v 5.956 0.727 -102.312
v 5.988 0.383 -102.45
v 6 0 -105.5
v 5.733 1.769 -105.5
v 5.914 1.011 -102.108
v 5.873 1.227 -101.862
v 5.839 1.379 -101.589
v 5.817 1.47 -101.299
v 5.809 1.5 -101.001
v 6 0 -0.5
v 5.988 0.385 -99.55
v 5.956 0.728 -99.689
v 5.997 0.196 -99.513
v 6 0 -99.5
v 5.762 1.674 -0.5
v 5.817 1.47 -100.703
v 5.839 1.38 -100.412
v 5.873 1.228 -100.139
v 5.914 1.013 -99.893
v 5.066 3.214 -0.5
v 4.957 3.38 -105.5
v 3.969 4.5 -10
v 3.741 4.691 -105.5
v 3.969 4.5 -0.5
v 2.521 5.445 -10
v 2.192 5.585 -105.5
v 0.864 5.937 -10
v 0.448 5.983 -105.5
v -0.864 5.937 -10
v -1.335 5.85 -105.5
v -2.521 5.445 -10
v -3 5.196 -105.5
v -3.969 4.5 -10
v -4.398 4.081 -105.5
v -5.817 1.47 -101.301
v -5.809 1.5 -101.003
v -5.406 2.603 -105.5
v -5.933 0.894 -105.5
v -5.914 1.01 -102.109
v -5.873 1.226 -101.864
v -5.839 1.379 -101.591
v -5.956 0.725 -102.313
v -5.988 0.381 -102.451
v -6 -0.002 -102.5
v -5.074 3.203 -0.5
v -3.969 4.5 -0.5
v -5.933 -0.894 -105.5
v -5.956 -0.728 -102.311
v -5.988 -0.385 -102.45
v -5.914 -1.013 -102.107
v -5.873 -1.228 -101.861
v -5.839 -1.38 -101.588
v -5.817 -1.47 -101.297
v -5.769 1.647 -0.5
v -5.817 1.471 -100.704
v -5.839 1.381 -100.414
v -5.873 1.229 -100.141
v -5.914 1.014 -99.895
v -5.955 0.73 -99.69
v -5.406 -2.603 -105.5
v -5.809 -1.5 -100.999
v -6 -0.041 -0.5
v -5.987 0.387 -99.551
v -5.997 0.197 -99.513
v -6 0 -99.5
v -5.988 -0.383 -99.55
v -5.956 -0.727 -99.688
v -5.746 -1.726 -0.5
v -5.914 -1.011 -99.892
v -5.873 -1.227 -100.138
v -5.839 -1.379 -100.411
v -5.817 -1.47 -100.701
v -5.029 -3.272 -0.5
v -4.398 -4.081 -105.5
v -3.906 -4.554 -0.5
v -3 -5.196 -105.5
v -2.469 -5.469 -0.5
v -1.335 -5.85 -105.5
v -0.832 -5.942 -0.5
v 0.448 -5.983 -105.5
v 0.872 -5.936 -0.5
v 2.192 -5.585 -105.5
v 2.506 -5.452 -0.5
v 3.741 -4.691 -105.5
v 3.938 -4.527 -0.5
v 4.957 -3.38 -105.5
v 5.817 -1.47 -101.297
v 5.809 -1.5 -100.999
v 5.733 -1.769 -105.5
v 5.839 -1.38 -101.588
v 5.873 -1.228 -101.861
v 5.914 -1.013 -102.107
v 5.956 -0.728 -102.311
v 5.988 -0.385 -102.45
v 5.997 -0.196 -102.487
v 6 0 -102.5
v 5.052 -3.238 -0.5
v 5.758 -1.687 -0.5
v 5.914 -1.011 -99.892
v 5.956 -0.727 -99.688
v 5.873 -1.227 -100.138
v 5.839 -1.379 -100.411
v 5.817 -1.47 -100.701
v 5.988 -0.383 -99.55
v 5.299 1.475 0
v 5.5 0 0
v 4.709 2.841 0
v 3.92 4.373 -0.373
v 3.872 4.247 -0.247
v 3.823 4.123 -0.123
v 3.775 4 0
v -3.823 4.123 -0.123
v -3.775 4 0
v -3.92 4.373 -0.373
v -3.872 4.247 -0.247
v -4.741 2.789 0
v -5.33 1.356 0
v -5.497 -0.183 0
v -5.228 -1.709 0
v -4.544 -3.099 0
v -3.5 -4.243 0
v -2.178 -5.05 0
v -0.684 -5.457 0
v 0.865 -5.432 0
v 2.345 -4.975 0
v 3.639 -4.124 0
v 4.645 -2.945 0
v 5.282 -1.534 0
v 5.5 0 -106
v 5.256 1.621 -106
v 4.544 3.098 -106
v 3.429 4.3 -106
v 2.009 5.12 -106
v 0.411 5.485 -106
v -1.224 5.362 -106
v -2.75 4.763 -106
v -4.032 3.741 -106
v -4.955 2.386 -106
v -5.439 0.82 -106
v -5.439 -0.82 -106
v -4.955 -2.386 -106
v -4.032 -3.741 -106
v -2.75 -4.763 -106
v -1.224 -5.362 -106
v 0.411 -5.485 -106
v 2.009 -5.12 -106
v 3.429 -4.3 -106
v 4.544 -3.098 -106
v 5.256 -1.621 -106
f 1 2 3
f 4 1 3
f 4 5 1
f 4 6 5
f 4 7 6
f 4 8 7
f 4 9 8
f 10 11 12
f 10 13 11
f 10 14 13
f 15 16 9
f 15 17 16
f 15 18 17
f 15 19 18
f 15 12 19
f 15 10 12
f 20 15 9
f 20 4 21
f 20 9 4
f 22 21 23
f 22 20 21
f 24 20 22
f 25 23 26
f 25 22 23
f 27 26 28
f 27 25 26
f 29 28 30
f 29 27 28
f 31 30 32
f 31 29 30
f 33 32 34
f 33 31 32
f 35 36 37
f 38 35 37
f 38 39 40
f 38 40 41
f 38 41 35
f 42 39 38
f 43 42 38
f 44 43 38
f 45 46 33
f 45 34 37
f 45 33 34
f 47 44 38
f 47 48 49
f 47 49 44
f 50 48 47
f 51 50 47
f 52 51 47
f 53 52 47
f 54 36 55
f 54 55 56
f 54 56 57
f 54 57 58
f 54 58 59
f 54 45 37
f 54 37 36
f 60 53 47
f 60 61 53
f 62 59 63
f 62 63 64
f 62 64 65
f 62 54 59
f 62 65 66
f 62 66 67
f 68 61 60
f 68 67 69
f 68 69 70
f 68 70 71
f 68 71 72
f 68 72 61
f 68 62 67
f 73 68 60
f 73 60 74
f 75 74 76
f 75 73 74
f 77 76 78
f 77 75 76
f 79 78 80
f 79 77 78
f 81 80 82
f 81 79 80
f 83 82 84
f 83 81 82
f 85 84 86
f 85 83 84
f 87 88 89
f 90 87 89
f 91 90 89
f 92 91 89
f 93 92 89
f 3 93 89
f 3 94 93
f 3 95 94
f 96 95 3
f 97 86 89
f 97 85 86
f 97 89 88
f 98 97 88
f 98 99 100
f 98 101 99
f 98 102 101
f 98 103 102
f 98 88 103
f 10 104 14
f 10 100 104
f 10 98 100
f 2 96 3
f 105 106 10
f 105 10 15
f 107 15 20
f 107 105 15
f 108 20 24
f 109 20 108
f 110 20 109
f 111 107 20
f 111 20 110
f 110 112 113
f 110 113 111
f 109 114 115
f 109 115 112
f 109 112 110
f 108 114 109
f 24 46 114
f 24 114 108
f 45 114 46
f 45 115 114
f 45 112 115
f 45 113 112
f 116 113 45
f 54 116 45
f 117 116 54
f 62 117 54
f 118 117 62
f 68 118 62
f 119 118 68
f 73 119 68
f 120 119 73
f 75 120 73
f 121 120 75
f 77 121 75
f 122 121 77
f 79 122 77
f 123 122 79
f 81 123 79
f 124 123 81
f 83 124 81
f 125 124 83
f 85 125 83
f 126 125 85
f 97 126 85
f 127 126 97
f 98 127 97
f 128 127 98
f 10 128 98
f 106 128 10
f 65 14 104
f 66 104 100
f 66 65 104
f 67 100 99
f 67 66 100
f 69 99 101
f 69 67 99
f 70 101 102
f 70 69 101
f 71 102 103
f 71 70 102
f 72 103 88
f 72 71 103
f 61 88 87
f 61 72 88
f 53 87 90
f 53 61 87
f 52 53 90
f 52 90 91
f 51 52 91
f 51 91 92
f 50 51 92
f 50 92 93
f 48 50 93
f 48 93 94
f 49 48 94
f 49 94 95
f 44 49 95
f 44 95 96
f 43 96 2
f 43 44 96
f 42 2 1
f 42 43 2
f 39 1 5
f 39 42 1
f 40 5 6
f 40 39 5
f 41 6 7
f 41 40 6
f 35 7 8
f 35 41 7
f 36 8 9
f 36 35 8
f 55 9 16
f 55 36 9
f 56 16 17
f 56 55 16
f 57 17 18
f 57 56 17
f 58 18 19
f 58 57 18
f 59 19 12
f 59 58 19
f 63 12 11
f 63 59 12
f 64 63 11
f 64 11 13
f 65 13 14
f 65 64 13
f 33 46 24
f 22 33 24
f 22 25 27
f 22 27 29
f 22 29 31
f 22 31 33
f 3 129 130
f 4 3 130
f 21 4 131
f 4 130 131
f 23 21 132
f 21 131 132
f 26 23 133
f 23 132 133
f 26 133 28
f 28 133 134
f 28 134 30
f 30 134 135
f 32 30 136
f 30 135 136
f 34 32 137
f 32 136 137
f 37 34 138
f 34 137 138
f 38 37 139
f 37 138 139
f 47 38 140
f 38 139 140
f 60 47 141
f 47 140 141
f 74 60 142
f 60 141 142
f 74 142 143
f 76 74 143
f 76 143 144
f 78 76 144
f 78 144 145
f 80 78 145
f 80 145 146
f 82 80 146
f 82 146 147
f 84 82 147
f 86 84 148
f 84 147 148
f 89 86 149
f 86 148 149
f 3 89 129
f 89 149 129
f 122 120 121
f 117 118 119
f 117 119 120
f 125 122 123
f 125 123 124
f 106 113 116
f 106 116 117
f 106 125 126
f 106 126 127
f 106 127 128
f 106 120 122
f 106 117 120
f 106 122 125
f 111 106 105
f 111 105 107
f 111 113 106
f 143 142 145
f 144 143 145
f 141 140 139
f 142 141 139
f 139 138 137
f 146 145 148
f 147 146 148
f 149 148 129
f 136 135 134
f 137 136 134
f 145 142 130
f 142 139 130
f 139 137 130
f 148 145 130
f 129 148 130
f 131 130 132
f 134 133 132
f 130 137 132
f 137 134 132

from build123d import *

# Parameters (mm, degrees)
SKETCH1_R               = 6
BOSS_EXTRUDE1_DEPTH     = 106
CUT_EXTRUDE1_DEPTH      = 107.339080304
CUT_EXTRUDE1_DEPTH_BACK = 107.339080304
SKETCH2_R               = 1.5
CUT_EXTRUDE2_DEPTH      = 10
CHAMFER1_SIZE           = 0.5


with BuildPart() as part:
    # Sketch1 → Boss-Extrude1 (new body)
    with BuildSketch(Plane.XY):
        Circle(SKETCH1_R)
    extrude(amount=-BOSS_EXTRUDE1_DEPTH)

    # Sketch2 → Cut-Extrude1 (cut, two sides: drawn at the far end of the back side and taken through both)
    with BuildSketch(Plane(origin=(0, 0, 0), x_dir=(0, 0, -1), z_dir=(1, 0, 0)).offset(-CUT_EXTRUDE1_DEPTH_BACK)):
        with Locations(Location((101, 0, 0), (0, 0, 180))):
            Circle(SKETCH2_R)
    extrude(amount=CUT_EXTRUDE1_DEPTH + CUT_EXTRUDE1_DEPTH_BACK, mode=Mode.SUBTRACT)

    # Sketch3 → Cut-Extrude2 (cut)
    with BuildSketch(Plane.XY):
        with BuildLine():
            Line((-3.968626967, 4.5), (3.968626967, 4.5))
            ThreePointArc((3.968626967, 4.5), (0, 6), (-3.968626967, 4.5))
        make_face()
    extrude(amount=-CUT_EXTRUDE2_DEPTH, mode=Mode.SUBTRACT)

    # Chamfer1
    chamfer1_edges = [part.edges().sort_by_distance(p)[0] for p in [
        (-2.468626967, -5.468626967, 0),
        (0, 4.5, 0),
        (-6, 0, -106),
    ]]
    chamfer(chamfer1_edges, length=CHAMFER1_SIZE)


solid = part.part
